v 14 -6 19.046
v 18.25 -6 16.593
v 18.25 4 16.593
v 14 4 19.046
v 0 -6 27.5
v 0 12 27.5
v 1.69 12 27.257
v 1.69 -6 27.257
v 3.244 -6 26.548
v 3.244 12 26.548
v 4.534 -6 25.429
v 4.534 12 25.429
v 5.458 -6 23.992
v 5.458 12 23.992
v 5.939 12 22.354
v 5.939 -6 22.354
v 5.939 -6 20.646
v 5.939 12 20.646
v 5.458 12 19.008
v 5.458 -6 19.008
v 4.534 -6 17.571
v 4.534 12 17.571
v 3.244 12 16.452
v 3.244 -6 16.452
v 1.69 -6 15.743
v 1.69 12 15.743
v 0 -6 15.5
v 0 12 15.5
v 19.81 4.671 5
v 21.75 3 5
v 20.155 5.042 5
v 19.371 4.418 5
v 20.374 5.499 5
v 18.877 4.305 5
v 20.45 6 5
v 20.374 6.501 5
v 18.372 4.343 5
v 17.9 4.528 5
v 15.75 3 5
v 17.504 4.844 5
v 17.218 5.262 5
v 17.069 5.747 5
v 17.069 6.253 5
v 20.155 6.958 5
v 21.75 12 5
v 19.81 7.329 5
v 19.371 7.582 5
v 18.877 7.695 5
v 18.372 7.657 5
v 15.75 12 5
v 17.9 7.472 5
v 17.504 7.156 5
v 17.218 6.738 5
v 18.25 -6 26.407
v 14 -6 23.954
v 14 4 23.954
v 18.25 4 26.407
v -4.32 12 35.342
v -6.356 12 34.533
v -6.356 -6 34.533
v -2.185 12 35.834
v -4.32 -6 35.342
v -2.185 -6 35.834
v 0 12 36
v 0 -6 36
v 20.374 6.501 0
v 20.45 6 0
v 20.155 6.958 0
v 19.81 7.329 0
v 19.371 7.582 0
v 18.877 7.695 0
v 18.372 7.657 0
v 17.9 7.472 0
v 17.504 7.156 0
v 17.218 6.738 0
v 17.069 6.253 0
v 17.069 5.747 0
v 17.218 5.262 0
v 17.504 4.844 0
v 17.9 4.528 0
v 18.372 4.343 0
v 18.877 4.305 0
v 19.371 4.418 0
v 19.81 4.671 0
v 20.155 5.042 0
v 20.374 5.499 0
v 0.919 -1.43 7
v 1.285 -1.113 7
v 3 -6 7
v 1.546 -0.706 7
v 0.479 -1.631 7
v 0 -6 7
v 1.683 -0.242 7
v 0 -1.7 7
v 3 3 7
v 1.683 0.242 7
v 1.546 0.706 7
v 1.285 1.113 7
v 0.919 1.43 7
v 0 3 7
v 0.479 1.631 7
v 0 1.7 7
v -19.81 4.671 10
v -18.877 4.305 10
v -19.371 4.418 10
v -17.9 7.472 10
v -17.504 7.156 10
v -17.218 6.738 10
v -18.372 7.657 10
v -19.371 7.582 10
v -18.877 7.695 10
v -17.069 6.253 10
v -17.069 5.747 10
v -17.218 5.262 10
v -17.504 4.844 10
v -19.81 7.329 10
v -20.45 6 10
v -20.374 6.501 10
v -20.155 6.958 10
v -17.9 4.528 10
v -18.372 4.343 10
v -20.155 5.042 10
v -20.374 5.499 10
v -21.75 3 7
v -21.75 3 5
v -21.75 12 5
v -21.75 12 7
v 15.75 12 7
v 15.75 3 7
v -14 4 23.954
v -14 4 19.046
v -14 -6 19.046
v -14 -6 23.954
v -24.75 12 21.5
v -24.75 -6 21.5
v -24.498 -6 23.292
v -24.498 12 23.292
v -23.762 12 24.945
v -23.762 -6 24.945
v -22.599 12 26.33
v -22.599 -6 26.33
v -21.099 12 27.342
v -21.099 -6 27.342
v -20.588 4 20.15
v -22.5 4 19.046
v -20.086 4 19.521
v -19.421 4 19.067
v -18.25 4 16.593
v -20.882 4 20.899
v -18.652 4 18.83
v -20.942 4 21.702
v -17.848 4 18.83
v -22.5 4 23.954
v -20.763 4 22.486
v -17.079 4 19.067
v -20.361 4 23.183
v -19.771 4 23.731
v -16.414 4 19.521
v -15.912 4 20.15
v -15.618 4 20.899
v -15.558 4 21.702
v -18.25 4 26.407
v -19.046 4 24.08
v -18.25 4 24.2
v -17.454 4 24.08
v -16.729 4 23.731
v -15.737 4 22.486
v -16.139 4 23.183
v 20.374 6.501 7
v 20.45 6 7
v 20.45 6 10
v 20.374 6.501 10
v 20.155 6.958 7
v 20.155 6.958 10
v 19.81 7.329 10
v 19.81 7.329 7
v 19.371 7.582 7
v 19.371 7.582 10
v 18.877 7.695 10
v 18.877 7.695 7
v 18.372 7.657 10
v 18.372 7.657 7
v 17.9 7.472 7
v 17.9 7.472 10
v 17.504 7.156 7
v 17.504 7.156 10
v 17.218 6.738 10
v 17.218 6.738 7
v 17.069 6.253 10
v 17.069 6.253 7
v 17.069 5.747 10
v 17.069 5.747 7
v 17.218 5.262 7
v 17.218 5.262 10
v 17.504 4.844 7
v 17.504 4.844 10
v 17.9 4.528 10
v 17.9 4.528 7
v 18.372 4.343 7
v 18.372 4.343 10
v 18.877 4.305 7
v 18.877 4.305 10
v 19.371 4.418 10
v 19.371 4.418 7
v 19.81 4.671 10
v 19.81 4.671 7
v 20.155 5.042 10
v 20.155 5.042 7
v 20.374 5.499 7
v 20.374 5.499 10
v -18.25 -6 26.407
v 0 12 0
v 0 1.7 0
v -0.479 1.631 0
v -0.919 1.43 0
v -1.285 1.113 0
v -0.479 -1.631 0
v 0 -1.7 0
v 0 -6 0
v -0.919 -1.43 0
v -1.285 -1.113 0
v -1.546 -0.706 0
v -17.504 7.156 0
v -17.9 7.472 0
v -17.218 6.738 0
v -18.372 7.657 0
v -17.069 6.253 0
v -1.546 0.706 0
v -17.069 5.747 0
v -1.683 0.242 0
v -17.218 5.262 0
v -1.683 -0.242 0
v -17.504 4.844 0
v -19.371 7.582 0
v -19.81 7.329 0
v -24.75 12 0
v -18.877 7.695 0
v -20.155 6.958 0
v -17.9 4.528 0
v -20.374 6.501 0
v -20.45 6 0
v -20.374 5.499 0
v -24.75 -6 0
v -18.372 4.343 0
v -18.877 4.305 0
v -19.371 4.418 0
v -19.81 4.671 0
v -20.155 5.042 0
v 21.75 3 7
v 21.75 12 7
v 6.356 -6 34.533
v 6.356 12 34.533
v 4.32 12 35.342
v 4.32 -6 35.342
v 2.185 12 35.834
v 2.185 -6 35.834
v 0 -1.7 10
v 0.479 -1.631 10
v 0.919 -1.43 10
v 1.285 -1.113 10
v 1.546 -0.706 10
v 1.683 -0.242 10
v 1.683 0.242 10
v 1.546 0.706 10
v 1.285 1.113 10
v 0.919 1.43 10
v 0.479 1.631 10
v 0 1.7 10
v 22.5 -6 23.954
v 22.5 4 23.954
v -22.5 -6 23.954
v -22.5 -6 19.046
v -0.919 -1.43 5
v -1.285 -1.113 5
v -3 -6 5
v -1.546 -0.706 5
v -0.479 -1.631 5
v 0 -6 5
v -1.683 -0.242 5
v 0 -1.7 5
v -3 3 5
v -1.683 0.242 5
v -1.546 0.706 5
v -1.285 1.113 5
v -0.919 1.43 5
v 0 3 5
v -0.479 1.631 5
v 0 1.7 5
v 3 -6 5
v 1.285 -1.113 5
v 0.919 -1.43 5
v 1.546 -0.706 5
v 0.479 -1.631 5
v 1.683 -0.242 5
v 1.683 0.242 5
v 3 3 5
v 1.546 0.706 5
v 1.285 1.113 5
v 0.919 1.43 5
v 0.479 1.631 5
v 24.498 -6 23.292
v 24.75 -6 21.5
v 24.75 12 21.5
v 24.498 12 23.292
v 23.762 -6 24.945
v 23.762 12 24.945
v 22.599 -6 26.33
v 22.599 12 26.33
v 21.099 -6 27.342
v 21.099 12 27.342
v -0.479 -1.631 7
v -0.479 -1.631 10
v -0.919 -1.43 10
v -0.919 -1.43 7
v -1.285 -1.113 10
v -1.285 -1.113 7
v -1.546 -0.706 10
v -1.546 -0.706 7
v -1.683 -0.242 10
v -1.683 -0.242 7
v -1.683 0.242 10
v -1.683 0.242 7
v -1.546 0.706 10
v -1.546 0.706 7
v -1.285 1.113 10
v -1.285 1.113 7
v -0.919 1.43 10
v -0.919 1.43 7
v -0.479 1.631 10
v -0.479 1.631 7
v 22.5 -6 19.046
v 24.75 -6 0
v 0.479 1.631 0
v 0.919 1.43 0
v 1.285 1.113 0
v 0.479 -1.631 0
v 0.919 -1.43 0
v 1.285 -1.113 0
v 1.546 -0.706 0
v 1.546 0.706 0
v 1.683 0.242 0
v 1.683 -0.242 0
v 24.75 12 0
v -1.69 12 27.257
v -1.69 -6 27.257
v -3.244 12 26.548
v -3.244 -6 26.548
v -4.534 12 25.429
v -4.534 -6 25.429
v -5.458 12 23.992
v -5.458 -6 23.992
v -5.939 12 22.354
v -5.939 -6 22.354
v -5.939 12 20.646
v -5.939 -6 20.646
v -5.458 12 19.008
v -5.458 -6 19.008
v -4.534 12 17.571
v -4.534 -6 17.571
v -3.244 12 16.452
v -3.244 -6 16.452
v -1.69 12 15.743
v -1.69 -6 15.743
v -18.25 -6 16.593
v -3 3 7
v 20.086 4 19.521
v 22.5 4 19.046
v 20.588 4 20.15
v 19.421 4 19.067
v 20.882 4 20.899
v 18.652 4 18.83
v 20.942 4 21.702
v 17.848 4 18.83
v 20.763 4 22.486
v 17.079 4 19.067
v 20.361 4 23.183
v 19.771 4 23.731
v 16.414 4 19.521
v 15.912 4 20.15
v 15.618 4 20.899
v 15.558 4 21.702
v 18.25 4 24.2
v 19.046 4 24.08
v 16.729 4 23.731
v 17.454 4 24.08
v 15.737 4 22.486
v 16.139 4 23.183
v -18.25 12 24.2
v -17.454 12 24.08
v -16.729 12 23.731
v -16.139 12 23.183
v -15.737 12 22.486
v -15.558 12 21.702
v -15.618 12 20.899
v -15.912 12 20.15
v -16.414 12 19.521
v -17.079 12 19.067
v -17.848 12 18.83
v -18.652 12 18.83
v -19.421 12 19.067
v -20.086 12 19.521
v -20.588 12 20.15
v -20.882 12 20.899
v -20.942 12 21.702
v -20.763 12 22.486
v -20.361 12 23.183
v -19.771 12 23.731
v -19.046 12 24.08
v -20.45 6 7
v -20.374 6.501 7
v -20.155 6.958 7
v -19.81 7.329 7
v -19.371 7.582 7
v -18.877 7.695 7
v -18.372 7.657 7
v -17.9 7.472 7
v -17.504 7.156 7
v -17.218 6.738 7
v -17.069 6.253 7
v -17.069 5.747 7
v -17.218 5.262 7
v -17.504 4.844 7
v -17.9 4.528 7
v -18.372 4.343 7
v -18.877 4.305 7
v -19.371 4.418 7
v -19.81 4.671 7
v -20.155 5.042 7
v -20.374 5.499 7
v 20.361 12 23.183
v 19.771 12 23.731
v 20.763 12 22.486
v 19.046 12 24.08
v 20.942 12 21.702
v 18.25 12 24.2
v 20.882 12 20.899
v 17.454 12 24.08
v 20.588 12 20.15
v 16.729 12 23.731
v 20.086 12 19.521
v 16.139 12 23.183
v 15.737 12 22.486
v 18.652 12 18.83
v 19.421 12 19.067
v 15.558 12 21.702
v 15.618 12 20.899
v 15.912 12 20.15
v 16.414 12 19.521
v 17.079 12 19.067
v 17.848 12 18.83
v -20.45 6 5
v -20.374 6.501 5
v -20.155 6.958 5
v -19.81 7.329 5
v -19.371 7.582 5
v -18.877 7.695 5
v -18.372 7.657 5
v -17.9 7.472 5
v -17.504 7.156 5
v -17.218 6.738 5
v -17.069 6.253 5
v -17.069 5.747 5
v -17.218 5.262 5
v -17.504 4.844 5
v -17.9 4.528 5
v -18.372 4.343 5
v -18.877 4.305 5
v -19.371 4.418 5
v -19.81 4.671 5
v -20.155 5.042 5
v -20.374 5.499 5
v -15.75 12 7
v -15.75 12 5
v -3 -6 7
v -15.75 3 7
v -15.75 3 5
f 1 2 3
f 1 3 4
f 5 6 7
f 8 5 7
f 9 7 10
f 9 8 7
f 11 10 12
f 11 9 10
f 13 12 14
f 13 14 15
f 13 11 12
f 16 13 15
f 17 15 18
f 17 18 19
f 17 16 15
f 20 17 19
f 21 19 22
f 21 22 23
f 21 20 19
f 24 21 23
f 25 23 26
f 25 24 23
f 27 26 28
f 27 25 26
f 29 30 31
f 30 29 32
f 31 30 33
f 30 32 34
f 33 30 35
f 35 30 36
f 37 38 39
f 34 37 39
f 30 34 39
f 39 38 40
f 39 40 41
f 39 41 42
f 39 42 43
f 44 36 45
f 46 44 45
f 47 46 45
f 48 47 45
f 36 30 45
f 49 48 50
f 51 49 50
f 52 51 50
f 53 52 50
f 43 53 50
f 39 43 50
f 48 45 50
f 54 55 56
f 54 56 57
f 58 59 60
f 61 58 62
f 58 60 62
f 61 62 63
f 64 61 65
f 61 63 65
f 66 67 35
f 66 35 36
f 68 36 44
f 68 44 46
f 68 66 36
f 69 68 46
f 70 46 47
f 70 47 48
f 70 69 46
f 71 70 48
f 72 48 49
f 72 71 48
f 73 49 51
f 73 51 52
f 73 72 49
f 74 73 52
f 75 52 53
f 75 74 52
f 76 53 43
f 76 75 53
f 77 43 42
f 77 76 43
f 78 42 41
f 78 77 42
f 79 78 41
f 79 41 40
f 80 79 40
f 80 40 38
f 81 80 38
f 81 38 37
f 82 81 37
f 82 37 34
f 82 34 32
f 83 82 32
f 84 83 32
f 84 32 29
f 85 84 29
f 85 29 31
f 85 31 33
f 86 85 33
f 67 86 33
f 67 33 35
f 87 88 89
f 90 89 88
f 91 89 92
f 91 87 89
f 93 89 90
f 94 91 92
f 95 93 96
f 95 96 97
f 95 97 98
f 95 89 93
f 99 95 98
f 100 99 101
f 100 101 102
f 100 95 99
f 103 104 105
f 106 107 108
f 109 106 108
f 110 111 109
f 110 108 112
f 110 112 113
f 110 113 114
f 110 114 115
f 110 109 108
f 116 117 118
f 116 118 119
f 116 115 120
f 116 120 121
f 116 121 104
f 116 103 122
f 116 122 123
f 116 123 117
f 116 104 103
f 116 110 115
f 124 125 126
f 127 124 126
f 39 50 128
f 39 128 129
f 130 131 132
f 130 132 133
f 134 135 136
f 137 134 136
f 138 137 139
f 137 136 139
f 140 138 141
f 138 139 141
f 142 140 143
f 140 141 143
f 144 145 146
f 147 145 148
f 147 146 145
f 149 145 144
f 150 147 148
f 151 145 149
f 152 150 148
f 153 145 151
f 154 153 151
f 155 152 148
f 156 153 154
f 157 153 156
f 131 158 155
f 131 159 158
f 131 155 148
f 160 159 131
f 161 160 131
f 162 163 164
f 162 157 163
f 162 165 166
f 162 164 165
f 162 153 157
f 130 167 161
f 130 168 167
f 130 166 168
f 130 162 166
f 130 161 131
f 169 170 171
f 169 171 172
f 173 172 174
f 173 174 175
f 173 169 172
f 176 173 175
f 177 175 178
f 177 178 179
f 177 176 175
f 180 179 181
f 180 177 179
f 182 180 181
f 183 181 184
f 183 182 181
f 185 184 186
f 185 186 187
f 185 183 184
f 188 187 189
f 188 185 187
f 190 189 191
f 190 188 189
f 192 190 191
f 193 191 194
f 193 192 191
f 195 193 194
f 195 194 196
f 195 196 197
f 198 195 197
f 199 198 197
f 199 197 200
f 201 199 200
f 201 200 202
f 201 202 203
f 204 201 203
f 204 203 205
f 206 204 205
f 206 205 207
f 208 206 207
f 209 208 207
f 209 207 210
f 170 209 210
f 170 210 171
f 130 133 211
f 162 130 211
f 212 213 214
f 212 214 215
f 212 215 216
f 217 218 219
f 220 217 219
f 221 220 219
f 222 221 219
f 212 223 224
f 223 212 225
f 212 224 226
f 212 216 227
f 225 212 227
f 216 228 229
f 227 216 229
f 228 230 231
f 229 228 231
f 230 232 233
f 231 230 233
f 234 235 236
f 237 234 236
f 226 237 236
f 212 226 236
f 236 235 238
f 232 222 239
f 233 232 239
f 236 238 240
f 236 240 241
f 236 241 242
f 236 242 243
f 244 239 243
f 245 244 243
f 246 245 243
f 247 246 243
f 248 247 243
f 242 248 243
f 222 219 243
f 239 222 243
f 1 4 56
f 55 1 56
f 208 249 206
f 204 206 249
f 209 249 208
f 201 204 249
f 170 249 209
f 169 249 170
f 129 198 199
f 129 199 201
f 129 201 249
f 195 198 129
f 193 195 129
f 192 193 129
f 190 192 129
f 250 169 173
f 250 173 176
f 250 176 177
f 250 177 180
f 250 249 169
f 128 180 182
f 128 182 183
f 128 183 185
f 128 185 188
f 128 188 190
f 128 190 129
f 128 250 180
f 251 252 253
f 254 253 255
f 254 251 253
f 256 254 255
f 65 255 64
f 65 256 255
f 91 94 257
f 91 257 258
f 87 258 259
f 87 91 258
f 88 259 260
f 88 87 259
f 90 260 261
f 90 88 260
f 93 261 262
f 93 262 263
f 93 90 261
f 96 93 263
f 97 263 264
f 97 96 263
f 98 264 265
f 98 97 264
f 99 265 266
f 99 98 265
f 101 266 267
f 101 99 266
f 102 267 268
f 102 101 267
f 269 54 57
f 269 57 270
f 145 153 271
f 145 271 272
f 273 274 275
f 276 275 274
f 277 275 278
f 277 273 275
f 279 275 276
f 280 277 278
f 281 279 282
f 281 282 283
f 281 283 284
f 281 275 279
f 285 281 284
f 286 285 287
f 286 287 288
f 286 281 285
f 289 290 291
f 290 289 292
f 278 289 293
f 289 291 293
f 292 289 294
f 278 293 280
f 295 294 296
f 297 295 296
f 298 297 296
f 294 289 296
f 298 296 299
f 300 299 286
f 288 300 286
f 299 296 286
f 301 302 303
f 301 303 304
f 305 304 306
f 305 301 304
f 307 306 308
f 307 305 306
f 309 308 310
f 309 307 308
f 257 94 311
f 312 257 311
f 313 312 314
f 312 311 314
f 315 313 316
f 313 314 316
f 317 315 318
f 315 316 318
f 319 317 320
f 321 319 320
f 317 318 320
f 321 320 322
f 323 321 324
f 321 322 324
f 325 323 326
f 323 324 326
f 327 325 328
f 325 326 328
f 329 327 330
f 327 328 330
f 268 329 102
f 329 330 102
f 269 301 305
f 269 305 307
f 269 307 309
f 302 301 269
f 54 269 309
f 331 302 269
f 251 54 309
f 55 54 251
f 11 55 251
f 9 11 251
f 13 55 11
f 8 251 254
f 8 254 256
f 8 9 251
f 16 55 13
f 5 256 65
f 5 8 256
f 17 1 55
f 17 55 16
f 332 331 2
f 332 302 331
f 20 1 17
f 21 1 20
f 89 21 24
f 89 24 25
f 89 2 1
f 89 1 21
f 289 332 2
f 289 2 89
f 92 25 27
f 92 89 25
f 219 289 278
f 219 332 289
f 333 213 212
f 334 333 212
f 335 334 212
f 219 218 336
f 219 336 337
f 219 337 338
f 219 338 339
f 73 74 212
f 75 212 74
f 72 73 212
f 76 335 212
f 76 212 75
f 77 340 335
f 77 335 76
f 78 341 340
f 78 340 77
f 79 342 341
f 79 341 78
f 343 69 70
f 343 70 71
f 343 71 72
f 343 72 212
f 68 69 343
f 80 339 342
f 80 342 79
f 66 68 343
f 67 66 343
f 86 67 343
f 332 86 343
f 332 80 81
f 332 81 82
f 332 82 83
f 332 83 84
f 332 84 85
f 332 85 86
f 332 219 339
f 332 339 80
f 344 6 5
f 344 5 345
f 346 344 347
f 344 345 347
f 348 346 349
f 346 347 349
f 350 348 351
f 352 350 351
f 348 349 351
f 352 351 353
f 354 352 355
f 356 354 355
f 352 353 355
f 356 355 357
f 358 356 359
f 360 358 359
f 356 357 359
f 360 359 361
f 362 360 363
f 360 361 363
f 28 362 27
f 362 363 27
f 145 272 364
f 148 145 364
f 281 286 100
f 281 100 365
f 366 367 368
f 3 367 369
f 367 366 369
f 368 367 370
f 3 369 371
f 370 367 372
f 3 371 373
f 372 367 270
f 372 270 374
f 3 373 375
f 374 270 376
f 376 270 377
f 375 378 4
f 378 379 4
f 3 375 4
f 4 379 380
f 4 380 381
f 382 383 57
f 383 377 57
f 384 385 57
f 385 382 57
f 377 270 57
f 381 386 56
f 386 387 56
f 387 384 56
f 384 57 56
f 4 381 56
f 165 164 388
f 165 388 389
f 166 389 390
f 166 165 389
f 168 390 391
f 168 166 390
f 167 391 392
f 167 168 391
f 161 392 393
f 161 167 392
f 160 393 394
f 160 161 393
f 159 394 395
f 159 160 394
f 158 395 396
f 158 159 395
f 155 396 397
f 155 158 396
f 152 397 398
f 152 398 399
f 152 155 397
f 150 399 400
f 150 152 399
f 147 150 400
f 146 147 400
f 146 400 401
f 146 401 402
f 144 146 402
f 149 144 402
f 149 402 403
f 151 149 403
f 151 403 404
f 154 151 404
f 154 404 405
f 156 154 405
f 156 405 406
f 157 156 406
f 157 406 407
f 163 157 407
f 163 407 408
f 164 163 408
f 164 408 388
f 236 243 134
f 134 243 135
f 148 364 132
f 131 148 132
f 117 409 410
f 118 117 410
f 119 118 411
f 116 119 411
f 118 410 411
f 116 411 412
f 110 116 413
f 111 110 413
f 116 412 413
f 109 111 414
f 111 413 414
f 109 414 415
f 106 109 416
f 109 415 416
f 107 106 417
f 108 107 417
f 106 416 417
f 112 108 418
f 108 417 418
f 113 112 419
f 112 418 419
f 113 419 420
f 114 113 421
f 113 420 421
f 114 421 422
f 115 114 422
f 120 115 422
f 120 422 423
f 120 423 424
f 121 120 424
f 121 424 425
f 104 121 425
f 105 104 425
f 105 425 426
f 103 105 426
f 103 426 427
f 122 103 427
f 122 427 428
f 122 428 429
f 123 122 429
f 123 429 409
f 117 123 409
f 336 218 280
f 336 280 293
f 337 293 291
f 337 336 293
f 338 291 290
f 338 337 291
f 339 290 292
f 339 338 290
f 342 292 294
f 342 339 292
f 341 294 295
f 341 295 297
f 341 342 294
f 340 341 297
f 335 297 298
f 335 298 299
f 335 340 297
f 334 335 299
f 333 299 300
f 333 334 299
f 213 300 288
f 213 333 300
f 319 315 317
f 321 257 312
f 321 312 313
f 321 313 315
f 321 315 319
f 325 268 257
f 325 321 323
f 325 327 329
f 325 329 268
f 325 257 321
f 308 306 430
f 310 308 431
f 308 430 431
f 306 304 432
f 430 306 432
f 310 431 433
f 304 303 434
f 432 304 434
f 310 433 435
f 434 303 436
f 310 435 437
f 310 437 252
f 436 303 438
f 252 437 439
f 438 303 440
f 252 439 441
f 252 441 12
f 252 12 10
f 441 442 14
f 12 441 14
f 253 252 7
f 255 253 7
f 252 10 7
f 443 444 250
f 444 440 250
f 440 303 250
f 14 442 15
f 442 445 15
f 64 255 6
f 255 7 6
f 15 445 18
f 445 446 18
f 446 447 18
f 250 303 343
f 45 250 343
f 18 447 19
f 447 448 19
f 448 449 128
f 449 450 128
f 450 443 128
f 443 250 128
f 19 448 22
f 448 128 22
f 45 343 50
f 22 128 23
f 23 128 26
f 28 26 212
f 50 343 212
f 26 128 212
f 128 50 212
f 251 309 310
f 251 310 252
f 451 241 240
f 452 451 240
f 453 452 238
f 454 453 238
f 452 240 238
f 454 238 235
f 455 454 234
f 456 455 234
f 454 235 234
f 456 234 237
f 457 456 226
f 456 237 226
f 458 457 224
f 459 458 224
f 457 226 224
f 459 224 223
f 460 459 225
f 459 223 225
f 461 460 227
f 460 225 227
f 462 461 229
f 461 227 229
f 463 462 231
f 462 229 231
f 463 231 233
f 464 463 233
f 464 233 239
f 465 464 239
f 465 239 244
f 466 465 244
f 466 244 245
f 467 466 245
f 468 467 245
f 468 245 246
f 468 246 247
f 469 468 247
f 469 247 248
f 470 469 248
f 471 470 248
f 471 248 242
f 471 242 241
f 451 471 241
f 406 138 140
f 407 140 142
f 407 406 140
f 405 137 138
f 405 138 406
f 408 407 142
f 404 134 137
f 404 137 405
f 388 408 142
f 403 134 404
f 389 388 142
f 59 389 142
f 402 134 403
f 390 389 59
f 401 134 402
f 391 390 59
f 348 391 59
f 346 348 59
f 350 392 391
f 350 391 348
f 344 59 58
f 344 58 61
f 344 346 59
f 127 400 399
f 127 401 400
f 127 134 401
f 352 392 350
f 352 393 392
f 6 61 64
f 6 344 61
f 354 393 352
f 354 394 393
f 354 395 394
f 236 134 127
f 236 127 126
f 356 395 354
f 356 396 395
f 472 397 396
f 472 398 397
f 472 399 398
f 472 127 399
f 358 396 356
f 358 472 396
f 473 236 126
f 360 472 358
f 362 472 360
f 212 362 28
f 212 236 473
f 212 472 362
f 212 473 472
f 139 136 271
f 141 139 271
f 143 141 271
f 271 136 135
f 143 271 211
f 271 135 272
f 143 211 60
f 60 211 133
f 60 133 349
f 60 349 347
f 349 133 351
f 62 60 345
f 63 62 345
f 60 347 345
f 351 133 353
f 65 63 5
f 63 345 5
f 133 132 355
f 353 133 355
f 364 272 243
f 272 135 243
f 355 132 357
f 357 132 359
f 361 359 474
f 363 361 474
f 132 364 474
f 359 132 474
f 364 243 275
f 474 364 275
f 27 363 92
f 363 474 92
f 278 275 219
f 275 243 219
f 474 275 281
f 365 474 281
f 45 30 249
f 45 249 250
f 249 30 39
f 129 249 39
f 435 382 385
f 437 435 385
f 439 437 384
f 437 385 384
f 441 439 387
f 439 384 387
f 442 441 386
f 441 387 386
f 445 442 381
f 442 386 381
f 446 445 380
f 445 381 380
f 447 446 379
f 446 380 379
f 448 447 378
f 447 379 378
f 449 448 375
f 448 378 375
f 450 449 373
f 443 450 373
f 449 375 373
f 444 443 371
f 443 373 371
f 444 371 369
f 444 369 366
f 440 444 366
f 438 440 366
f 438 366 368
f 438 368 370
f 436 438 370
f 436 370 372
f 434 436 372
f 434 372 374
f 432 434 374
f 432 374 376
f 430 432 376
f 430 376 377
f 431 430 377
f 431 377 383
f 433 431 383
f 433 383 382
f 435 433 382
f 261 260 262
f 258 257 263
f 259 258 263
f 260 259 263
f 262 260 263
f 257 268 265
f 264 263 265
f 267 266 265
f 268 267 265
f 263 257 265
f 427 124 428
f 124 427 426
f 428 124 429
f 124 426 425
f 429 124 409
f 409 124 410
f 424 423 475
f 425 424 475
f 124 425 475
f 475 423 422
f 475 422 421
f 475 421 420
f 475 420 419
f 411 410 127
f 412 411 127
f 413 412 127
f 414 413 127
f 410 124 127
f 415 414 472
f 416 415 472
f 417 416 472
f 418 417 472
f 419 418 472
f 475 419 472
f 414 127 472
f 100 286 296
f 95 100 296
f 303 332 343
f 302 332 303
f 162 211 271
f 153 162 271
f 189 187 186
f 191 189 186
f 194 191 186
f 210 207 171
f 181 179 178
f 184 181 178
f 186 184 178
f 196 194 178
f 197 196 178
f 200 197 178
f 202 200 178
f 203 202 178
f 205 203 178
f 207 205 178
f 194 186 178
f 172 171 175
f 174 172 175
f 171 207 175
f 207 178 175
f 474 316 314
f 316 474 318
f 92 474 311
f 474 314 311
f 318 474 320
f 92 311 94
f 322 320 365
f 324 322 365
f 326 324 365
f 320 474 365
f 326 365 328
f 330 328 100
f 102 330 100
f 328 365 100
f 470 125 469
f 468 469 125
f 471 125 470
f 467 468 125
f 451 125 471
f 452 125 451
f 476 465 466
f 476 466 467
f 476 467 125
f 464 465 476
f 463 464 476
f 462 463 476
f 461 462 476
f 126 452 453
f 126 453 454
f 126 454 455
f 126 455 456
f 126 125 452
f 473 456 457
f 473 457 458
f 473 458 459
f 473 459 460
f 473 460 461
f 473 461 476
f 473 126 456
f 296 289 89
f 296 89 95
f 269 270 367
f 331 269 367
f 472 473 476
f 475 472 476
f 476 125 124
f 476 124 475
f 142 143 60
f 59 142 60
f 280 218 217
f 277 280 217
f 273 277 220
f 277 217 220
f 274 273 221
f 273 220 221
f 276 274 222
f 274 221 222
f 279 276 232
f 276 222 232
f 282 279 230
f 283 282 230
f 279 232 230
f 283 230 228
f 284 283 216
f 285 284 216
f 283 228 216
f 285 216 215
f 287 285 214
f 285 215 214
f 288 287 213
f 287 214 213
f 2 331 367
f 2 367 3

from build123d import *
from build123d.topology import SkipClean

# Parameters (mm, degrees)
BOSS_EXTRUDE1_DEPTH      = 12
BOSS_EXTRUDE1_DEPTH_BACK = 6
SKETCH1_R                = 2.7
SKETCH3_R                = 1.7
CUT_EXTRUDE1_DEPTH       = 10
CUT_EXTRUDE2_START       = -5
CUT_EXTRUDE2_DEPTH       = 2
CUT_EXTRUDE3_DEPTH       = 10


with BuildPart() as part:
    # Sketch1 → Boss-Extrude1 (new, two sides: drawn at the far end of the back side and taken through both)
    with BuildSketch(Plane(origin=(0, 0, 0), x_dir=(1, 0, 0), z_dir=(0, 1, 0)).offset(-BOSS_EXTRUDE1_DEPTH_BACK)):
        with BuildLine():
            Line((-24.75, 0), (-24.75, -21.5))
            ThreePointArc((-24.75, -21.5), (-23.762283916, -24.944521161), (-21.099315068, -27.342208798))
            Line((-21.099315068, -27.342208798), (-6.356164384, -34.532619627))
            ThreePointArc((-6.356164384, -34.532619627), (-3.261672532, -35.628393125), (0, -36))
            Line((0, -36), (0, -27.5))
            ThreePointArc((0, -27.5), (-6, -21.5), (0, -15.5))
            Line((0, -15.5), (0, 0))
            Line((0, 0), (-24.75, 0))
        make_face()
        with Locations(Location((-18.25, -21.5, 0), (0, 0, 270))):
            Circle(SKETCH1_R, mode=Mode.SUBTRACT)
    extrude(amount=BOSS_EXTRUDE1_DEPTH + BOSS_EXTRUDE1_DEPTH_BACK)

    # Sketch3 → Cut-Extrude1 (cut)
    with BuildSketch(Plane(origin=(0, 0, 0), x_dir=(-1, 0, 0), z_dir=(0, 0, -1))):
        with Locations((18.75, 6)):
            Circle(SKETCH3_R)
        with BuildLine():
            Line((0, 1.7), (0, -1.7))
            ThreePointArc((0, -1.7), (1.7, 0), (0, 1.7))
        make_face()
    extrude(amount=-CUT_EXTRUDE1_DEPTH, mode=Mode.SUBTRACT)

    # Sketch4 → Cut-Extrude2 (cut)
    with BuildSketch(Plane(origin=(0, 0, 0), x_dir=(-1, 0, 0), z_dir=(0, 0, -1)).offset(CUT_EXTRUDE2_START)):
        Polygon((15.75, 9), (15.75, 12), (21.75, 12), (21.75, 9), (21.75, 3), (15.75, 3), align=None)
        Polygon((0, 3), (3, 3), (3, 0), (3, -6), (0, -6), align=None)
    extrude(amount=-CUT_EXTRUDE2_DEPTH, mode=Mode.SUBTRACT)

    # Sketch6 → Cut-Extrude3 (cut)
    with BuildSketch(Plane.XZ.offset(6)):
        Polygon((-14, 23.953738644), (-18.25, 26.407477288), (-22.5, 23.953738644), (-22.5, 19.046261356), (-18.25, 16.592522712), (-14, 19.046261356), align=None)
    extrude(amount=-CUT_EXTRUDE3_DEPTH, mode=Mode.SUBTRACT)

    # Mirror1: part across plane


with BuildPart() as part_1:
    with SkipClean():  # the faces are left unmerged after this step: merging them gives an invalid solid
        add(part.part)
        add(part.part.mirror(Plane(origin=(0, -6, 0), x_dir=(0, 0, 1), z_dir=(1, 0, 0))))


solid = part_1.part
